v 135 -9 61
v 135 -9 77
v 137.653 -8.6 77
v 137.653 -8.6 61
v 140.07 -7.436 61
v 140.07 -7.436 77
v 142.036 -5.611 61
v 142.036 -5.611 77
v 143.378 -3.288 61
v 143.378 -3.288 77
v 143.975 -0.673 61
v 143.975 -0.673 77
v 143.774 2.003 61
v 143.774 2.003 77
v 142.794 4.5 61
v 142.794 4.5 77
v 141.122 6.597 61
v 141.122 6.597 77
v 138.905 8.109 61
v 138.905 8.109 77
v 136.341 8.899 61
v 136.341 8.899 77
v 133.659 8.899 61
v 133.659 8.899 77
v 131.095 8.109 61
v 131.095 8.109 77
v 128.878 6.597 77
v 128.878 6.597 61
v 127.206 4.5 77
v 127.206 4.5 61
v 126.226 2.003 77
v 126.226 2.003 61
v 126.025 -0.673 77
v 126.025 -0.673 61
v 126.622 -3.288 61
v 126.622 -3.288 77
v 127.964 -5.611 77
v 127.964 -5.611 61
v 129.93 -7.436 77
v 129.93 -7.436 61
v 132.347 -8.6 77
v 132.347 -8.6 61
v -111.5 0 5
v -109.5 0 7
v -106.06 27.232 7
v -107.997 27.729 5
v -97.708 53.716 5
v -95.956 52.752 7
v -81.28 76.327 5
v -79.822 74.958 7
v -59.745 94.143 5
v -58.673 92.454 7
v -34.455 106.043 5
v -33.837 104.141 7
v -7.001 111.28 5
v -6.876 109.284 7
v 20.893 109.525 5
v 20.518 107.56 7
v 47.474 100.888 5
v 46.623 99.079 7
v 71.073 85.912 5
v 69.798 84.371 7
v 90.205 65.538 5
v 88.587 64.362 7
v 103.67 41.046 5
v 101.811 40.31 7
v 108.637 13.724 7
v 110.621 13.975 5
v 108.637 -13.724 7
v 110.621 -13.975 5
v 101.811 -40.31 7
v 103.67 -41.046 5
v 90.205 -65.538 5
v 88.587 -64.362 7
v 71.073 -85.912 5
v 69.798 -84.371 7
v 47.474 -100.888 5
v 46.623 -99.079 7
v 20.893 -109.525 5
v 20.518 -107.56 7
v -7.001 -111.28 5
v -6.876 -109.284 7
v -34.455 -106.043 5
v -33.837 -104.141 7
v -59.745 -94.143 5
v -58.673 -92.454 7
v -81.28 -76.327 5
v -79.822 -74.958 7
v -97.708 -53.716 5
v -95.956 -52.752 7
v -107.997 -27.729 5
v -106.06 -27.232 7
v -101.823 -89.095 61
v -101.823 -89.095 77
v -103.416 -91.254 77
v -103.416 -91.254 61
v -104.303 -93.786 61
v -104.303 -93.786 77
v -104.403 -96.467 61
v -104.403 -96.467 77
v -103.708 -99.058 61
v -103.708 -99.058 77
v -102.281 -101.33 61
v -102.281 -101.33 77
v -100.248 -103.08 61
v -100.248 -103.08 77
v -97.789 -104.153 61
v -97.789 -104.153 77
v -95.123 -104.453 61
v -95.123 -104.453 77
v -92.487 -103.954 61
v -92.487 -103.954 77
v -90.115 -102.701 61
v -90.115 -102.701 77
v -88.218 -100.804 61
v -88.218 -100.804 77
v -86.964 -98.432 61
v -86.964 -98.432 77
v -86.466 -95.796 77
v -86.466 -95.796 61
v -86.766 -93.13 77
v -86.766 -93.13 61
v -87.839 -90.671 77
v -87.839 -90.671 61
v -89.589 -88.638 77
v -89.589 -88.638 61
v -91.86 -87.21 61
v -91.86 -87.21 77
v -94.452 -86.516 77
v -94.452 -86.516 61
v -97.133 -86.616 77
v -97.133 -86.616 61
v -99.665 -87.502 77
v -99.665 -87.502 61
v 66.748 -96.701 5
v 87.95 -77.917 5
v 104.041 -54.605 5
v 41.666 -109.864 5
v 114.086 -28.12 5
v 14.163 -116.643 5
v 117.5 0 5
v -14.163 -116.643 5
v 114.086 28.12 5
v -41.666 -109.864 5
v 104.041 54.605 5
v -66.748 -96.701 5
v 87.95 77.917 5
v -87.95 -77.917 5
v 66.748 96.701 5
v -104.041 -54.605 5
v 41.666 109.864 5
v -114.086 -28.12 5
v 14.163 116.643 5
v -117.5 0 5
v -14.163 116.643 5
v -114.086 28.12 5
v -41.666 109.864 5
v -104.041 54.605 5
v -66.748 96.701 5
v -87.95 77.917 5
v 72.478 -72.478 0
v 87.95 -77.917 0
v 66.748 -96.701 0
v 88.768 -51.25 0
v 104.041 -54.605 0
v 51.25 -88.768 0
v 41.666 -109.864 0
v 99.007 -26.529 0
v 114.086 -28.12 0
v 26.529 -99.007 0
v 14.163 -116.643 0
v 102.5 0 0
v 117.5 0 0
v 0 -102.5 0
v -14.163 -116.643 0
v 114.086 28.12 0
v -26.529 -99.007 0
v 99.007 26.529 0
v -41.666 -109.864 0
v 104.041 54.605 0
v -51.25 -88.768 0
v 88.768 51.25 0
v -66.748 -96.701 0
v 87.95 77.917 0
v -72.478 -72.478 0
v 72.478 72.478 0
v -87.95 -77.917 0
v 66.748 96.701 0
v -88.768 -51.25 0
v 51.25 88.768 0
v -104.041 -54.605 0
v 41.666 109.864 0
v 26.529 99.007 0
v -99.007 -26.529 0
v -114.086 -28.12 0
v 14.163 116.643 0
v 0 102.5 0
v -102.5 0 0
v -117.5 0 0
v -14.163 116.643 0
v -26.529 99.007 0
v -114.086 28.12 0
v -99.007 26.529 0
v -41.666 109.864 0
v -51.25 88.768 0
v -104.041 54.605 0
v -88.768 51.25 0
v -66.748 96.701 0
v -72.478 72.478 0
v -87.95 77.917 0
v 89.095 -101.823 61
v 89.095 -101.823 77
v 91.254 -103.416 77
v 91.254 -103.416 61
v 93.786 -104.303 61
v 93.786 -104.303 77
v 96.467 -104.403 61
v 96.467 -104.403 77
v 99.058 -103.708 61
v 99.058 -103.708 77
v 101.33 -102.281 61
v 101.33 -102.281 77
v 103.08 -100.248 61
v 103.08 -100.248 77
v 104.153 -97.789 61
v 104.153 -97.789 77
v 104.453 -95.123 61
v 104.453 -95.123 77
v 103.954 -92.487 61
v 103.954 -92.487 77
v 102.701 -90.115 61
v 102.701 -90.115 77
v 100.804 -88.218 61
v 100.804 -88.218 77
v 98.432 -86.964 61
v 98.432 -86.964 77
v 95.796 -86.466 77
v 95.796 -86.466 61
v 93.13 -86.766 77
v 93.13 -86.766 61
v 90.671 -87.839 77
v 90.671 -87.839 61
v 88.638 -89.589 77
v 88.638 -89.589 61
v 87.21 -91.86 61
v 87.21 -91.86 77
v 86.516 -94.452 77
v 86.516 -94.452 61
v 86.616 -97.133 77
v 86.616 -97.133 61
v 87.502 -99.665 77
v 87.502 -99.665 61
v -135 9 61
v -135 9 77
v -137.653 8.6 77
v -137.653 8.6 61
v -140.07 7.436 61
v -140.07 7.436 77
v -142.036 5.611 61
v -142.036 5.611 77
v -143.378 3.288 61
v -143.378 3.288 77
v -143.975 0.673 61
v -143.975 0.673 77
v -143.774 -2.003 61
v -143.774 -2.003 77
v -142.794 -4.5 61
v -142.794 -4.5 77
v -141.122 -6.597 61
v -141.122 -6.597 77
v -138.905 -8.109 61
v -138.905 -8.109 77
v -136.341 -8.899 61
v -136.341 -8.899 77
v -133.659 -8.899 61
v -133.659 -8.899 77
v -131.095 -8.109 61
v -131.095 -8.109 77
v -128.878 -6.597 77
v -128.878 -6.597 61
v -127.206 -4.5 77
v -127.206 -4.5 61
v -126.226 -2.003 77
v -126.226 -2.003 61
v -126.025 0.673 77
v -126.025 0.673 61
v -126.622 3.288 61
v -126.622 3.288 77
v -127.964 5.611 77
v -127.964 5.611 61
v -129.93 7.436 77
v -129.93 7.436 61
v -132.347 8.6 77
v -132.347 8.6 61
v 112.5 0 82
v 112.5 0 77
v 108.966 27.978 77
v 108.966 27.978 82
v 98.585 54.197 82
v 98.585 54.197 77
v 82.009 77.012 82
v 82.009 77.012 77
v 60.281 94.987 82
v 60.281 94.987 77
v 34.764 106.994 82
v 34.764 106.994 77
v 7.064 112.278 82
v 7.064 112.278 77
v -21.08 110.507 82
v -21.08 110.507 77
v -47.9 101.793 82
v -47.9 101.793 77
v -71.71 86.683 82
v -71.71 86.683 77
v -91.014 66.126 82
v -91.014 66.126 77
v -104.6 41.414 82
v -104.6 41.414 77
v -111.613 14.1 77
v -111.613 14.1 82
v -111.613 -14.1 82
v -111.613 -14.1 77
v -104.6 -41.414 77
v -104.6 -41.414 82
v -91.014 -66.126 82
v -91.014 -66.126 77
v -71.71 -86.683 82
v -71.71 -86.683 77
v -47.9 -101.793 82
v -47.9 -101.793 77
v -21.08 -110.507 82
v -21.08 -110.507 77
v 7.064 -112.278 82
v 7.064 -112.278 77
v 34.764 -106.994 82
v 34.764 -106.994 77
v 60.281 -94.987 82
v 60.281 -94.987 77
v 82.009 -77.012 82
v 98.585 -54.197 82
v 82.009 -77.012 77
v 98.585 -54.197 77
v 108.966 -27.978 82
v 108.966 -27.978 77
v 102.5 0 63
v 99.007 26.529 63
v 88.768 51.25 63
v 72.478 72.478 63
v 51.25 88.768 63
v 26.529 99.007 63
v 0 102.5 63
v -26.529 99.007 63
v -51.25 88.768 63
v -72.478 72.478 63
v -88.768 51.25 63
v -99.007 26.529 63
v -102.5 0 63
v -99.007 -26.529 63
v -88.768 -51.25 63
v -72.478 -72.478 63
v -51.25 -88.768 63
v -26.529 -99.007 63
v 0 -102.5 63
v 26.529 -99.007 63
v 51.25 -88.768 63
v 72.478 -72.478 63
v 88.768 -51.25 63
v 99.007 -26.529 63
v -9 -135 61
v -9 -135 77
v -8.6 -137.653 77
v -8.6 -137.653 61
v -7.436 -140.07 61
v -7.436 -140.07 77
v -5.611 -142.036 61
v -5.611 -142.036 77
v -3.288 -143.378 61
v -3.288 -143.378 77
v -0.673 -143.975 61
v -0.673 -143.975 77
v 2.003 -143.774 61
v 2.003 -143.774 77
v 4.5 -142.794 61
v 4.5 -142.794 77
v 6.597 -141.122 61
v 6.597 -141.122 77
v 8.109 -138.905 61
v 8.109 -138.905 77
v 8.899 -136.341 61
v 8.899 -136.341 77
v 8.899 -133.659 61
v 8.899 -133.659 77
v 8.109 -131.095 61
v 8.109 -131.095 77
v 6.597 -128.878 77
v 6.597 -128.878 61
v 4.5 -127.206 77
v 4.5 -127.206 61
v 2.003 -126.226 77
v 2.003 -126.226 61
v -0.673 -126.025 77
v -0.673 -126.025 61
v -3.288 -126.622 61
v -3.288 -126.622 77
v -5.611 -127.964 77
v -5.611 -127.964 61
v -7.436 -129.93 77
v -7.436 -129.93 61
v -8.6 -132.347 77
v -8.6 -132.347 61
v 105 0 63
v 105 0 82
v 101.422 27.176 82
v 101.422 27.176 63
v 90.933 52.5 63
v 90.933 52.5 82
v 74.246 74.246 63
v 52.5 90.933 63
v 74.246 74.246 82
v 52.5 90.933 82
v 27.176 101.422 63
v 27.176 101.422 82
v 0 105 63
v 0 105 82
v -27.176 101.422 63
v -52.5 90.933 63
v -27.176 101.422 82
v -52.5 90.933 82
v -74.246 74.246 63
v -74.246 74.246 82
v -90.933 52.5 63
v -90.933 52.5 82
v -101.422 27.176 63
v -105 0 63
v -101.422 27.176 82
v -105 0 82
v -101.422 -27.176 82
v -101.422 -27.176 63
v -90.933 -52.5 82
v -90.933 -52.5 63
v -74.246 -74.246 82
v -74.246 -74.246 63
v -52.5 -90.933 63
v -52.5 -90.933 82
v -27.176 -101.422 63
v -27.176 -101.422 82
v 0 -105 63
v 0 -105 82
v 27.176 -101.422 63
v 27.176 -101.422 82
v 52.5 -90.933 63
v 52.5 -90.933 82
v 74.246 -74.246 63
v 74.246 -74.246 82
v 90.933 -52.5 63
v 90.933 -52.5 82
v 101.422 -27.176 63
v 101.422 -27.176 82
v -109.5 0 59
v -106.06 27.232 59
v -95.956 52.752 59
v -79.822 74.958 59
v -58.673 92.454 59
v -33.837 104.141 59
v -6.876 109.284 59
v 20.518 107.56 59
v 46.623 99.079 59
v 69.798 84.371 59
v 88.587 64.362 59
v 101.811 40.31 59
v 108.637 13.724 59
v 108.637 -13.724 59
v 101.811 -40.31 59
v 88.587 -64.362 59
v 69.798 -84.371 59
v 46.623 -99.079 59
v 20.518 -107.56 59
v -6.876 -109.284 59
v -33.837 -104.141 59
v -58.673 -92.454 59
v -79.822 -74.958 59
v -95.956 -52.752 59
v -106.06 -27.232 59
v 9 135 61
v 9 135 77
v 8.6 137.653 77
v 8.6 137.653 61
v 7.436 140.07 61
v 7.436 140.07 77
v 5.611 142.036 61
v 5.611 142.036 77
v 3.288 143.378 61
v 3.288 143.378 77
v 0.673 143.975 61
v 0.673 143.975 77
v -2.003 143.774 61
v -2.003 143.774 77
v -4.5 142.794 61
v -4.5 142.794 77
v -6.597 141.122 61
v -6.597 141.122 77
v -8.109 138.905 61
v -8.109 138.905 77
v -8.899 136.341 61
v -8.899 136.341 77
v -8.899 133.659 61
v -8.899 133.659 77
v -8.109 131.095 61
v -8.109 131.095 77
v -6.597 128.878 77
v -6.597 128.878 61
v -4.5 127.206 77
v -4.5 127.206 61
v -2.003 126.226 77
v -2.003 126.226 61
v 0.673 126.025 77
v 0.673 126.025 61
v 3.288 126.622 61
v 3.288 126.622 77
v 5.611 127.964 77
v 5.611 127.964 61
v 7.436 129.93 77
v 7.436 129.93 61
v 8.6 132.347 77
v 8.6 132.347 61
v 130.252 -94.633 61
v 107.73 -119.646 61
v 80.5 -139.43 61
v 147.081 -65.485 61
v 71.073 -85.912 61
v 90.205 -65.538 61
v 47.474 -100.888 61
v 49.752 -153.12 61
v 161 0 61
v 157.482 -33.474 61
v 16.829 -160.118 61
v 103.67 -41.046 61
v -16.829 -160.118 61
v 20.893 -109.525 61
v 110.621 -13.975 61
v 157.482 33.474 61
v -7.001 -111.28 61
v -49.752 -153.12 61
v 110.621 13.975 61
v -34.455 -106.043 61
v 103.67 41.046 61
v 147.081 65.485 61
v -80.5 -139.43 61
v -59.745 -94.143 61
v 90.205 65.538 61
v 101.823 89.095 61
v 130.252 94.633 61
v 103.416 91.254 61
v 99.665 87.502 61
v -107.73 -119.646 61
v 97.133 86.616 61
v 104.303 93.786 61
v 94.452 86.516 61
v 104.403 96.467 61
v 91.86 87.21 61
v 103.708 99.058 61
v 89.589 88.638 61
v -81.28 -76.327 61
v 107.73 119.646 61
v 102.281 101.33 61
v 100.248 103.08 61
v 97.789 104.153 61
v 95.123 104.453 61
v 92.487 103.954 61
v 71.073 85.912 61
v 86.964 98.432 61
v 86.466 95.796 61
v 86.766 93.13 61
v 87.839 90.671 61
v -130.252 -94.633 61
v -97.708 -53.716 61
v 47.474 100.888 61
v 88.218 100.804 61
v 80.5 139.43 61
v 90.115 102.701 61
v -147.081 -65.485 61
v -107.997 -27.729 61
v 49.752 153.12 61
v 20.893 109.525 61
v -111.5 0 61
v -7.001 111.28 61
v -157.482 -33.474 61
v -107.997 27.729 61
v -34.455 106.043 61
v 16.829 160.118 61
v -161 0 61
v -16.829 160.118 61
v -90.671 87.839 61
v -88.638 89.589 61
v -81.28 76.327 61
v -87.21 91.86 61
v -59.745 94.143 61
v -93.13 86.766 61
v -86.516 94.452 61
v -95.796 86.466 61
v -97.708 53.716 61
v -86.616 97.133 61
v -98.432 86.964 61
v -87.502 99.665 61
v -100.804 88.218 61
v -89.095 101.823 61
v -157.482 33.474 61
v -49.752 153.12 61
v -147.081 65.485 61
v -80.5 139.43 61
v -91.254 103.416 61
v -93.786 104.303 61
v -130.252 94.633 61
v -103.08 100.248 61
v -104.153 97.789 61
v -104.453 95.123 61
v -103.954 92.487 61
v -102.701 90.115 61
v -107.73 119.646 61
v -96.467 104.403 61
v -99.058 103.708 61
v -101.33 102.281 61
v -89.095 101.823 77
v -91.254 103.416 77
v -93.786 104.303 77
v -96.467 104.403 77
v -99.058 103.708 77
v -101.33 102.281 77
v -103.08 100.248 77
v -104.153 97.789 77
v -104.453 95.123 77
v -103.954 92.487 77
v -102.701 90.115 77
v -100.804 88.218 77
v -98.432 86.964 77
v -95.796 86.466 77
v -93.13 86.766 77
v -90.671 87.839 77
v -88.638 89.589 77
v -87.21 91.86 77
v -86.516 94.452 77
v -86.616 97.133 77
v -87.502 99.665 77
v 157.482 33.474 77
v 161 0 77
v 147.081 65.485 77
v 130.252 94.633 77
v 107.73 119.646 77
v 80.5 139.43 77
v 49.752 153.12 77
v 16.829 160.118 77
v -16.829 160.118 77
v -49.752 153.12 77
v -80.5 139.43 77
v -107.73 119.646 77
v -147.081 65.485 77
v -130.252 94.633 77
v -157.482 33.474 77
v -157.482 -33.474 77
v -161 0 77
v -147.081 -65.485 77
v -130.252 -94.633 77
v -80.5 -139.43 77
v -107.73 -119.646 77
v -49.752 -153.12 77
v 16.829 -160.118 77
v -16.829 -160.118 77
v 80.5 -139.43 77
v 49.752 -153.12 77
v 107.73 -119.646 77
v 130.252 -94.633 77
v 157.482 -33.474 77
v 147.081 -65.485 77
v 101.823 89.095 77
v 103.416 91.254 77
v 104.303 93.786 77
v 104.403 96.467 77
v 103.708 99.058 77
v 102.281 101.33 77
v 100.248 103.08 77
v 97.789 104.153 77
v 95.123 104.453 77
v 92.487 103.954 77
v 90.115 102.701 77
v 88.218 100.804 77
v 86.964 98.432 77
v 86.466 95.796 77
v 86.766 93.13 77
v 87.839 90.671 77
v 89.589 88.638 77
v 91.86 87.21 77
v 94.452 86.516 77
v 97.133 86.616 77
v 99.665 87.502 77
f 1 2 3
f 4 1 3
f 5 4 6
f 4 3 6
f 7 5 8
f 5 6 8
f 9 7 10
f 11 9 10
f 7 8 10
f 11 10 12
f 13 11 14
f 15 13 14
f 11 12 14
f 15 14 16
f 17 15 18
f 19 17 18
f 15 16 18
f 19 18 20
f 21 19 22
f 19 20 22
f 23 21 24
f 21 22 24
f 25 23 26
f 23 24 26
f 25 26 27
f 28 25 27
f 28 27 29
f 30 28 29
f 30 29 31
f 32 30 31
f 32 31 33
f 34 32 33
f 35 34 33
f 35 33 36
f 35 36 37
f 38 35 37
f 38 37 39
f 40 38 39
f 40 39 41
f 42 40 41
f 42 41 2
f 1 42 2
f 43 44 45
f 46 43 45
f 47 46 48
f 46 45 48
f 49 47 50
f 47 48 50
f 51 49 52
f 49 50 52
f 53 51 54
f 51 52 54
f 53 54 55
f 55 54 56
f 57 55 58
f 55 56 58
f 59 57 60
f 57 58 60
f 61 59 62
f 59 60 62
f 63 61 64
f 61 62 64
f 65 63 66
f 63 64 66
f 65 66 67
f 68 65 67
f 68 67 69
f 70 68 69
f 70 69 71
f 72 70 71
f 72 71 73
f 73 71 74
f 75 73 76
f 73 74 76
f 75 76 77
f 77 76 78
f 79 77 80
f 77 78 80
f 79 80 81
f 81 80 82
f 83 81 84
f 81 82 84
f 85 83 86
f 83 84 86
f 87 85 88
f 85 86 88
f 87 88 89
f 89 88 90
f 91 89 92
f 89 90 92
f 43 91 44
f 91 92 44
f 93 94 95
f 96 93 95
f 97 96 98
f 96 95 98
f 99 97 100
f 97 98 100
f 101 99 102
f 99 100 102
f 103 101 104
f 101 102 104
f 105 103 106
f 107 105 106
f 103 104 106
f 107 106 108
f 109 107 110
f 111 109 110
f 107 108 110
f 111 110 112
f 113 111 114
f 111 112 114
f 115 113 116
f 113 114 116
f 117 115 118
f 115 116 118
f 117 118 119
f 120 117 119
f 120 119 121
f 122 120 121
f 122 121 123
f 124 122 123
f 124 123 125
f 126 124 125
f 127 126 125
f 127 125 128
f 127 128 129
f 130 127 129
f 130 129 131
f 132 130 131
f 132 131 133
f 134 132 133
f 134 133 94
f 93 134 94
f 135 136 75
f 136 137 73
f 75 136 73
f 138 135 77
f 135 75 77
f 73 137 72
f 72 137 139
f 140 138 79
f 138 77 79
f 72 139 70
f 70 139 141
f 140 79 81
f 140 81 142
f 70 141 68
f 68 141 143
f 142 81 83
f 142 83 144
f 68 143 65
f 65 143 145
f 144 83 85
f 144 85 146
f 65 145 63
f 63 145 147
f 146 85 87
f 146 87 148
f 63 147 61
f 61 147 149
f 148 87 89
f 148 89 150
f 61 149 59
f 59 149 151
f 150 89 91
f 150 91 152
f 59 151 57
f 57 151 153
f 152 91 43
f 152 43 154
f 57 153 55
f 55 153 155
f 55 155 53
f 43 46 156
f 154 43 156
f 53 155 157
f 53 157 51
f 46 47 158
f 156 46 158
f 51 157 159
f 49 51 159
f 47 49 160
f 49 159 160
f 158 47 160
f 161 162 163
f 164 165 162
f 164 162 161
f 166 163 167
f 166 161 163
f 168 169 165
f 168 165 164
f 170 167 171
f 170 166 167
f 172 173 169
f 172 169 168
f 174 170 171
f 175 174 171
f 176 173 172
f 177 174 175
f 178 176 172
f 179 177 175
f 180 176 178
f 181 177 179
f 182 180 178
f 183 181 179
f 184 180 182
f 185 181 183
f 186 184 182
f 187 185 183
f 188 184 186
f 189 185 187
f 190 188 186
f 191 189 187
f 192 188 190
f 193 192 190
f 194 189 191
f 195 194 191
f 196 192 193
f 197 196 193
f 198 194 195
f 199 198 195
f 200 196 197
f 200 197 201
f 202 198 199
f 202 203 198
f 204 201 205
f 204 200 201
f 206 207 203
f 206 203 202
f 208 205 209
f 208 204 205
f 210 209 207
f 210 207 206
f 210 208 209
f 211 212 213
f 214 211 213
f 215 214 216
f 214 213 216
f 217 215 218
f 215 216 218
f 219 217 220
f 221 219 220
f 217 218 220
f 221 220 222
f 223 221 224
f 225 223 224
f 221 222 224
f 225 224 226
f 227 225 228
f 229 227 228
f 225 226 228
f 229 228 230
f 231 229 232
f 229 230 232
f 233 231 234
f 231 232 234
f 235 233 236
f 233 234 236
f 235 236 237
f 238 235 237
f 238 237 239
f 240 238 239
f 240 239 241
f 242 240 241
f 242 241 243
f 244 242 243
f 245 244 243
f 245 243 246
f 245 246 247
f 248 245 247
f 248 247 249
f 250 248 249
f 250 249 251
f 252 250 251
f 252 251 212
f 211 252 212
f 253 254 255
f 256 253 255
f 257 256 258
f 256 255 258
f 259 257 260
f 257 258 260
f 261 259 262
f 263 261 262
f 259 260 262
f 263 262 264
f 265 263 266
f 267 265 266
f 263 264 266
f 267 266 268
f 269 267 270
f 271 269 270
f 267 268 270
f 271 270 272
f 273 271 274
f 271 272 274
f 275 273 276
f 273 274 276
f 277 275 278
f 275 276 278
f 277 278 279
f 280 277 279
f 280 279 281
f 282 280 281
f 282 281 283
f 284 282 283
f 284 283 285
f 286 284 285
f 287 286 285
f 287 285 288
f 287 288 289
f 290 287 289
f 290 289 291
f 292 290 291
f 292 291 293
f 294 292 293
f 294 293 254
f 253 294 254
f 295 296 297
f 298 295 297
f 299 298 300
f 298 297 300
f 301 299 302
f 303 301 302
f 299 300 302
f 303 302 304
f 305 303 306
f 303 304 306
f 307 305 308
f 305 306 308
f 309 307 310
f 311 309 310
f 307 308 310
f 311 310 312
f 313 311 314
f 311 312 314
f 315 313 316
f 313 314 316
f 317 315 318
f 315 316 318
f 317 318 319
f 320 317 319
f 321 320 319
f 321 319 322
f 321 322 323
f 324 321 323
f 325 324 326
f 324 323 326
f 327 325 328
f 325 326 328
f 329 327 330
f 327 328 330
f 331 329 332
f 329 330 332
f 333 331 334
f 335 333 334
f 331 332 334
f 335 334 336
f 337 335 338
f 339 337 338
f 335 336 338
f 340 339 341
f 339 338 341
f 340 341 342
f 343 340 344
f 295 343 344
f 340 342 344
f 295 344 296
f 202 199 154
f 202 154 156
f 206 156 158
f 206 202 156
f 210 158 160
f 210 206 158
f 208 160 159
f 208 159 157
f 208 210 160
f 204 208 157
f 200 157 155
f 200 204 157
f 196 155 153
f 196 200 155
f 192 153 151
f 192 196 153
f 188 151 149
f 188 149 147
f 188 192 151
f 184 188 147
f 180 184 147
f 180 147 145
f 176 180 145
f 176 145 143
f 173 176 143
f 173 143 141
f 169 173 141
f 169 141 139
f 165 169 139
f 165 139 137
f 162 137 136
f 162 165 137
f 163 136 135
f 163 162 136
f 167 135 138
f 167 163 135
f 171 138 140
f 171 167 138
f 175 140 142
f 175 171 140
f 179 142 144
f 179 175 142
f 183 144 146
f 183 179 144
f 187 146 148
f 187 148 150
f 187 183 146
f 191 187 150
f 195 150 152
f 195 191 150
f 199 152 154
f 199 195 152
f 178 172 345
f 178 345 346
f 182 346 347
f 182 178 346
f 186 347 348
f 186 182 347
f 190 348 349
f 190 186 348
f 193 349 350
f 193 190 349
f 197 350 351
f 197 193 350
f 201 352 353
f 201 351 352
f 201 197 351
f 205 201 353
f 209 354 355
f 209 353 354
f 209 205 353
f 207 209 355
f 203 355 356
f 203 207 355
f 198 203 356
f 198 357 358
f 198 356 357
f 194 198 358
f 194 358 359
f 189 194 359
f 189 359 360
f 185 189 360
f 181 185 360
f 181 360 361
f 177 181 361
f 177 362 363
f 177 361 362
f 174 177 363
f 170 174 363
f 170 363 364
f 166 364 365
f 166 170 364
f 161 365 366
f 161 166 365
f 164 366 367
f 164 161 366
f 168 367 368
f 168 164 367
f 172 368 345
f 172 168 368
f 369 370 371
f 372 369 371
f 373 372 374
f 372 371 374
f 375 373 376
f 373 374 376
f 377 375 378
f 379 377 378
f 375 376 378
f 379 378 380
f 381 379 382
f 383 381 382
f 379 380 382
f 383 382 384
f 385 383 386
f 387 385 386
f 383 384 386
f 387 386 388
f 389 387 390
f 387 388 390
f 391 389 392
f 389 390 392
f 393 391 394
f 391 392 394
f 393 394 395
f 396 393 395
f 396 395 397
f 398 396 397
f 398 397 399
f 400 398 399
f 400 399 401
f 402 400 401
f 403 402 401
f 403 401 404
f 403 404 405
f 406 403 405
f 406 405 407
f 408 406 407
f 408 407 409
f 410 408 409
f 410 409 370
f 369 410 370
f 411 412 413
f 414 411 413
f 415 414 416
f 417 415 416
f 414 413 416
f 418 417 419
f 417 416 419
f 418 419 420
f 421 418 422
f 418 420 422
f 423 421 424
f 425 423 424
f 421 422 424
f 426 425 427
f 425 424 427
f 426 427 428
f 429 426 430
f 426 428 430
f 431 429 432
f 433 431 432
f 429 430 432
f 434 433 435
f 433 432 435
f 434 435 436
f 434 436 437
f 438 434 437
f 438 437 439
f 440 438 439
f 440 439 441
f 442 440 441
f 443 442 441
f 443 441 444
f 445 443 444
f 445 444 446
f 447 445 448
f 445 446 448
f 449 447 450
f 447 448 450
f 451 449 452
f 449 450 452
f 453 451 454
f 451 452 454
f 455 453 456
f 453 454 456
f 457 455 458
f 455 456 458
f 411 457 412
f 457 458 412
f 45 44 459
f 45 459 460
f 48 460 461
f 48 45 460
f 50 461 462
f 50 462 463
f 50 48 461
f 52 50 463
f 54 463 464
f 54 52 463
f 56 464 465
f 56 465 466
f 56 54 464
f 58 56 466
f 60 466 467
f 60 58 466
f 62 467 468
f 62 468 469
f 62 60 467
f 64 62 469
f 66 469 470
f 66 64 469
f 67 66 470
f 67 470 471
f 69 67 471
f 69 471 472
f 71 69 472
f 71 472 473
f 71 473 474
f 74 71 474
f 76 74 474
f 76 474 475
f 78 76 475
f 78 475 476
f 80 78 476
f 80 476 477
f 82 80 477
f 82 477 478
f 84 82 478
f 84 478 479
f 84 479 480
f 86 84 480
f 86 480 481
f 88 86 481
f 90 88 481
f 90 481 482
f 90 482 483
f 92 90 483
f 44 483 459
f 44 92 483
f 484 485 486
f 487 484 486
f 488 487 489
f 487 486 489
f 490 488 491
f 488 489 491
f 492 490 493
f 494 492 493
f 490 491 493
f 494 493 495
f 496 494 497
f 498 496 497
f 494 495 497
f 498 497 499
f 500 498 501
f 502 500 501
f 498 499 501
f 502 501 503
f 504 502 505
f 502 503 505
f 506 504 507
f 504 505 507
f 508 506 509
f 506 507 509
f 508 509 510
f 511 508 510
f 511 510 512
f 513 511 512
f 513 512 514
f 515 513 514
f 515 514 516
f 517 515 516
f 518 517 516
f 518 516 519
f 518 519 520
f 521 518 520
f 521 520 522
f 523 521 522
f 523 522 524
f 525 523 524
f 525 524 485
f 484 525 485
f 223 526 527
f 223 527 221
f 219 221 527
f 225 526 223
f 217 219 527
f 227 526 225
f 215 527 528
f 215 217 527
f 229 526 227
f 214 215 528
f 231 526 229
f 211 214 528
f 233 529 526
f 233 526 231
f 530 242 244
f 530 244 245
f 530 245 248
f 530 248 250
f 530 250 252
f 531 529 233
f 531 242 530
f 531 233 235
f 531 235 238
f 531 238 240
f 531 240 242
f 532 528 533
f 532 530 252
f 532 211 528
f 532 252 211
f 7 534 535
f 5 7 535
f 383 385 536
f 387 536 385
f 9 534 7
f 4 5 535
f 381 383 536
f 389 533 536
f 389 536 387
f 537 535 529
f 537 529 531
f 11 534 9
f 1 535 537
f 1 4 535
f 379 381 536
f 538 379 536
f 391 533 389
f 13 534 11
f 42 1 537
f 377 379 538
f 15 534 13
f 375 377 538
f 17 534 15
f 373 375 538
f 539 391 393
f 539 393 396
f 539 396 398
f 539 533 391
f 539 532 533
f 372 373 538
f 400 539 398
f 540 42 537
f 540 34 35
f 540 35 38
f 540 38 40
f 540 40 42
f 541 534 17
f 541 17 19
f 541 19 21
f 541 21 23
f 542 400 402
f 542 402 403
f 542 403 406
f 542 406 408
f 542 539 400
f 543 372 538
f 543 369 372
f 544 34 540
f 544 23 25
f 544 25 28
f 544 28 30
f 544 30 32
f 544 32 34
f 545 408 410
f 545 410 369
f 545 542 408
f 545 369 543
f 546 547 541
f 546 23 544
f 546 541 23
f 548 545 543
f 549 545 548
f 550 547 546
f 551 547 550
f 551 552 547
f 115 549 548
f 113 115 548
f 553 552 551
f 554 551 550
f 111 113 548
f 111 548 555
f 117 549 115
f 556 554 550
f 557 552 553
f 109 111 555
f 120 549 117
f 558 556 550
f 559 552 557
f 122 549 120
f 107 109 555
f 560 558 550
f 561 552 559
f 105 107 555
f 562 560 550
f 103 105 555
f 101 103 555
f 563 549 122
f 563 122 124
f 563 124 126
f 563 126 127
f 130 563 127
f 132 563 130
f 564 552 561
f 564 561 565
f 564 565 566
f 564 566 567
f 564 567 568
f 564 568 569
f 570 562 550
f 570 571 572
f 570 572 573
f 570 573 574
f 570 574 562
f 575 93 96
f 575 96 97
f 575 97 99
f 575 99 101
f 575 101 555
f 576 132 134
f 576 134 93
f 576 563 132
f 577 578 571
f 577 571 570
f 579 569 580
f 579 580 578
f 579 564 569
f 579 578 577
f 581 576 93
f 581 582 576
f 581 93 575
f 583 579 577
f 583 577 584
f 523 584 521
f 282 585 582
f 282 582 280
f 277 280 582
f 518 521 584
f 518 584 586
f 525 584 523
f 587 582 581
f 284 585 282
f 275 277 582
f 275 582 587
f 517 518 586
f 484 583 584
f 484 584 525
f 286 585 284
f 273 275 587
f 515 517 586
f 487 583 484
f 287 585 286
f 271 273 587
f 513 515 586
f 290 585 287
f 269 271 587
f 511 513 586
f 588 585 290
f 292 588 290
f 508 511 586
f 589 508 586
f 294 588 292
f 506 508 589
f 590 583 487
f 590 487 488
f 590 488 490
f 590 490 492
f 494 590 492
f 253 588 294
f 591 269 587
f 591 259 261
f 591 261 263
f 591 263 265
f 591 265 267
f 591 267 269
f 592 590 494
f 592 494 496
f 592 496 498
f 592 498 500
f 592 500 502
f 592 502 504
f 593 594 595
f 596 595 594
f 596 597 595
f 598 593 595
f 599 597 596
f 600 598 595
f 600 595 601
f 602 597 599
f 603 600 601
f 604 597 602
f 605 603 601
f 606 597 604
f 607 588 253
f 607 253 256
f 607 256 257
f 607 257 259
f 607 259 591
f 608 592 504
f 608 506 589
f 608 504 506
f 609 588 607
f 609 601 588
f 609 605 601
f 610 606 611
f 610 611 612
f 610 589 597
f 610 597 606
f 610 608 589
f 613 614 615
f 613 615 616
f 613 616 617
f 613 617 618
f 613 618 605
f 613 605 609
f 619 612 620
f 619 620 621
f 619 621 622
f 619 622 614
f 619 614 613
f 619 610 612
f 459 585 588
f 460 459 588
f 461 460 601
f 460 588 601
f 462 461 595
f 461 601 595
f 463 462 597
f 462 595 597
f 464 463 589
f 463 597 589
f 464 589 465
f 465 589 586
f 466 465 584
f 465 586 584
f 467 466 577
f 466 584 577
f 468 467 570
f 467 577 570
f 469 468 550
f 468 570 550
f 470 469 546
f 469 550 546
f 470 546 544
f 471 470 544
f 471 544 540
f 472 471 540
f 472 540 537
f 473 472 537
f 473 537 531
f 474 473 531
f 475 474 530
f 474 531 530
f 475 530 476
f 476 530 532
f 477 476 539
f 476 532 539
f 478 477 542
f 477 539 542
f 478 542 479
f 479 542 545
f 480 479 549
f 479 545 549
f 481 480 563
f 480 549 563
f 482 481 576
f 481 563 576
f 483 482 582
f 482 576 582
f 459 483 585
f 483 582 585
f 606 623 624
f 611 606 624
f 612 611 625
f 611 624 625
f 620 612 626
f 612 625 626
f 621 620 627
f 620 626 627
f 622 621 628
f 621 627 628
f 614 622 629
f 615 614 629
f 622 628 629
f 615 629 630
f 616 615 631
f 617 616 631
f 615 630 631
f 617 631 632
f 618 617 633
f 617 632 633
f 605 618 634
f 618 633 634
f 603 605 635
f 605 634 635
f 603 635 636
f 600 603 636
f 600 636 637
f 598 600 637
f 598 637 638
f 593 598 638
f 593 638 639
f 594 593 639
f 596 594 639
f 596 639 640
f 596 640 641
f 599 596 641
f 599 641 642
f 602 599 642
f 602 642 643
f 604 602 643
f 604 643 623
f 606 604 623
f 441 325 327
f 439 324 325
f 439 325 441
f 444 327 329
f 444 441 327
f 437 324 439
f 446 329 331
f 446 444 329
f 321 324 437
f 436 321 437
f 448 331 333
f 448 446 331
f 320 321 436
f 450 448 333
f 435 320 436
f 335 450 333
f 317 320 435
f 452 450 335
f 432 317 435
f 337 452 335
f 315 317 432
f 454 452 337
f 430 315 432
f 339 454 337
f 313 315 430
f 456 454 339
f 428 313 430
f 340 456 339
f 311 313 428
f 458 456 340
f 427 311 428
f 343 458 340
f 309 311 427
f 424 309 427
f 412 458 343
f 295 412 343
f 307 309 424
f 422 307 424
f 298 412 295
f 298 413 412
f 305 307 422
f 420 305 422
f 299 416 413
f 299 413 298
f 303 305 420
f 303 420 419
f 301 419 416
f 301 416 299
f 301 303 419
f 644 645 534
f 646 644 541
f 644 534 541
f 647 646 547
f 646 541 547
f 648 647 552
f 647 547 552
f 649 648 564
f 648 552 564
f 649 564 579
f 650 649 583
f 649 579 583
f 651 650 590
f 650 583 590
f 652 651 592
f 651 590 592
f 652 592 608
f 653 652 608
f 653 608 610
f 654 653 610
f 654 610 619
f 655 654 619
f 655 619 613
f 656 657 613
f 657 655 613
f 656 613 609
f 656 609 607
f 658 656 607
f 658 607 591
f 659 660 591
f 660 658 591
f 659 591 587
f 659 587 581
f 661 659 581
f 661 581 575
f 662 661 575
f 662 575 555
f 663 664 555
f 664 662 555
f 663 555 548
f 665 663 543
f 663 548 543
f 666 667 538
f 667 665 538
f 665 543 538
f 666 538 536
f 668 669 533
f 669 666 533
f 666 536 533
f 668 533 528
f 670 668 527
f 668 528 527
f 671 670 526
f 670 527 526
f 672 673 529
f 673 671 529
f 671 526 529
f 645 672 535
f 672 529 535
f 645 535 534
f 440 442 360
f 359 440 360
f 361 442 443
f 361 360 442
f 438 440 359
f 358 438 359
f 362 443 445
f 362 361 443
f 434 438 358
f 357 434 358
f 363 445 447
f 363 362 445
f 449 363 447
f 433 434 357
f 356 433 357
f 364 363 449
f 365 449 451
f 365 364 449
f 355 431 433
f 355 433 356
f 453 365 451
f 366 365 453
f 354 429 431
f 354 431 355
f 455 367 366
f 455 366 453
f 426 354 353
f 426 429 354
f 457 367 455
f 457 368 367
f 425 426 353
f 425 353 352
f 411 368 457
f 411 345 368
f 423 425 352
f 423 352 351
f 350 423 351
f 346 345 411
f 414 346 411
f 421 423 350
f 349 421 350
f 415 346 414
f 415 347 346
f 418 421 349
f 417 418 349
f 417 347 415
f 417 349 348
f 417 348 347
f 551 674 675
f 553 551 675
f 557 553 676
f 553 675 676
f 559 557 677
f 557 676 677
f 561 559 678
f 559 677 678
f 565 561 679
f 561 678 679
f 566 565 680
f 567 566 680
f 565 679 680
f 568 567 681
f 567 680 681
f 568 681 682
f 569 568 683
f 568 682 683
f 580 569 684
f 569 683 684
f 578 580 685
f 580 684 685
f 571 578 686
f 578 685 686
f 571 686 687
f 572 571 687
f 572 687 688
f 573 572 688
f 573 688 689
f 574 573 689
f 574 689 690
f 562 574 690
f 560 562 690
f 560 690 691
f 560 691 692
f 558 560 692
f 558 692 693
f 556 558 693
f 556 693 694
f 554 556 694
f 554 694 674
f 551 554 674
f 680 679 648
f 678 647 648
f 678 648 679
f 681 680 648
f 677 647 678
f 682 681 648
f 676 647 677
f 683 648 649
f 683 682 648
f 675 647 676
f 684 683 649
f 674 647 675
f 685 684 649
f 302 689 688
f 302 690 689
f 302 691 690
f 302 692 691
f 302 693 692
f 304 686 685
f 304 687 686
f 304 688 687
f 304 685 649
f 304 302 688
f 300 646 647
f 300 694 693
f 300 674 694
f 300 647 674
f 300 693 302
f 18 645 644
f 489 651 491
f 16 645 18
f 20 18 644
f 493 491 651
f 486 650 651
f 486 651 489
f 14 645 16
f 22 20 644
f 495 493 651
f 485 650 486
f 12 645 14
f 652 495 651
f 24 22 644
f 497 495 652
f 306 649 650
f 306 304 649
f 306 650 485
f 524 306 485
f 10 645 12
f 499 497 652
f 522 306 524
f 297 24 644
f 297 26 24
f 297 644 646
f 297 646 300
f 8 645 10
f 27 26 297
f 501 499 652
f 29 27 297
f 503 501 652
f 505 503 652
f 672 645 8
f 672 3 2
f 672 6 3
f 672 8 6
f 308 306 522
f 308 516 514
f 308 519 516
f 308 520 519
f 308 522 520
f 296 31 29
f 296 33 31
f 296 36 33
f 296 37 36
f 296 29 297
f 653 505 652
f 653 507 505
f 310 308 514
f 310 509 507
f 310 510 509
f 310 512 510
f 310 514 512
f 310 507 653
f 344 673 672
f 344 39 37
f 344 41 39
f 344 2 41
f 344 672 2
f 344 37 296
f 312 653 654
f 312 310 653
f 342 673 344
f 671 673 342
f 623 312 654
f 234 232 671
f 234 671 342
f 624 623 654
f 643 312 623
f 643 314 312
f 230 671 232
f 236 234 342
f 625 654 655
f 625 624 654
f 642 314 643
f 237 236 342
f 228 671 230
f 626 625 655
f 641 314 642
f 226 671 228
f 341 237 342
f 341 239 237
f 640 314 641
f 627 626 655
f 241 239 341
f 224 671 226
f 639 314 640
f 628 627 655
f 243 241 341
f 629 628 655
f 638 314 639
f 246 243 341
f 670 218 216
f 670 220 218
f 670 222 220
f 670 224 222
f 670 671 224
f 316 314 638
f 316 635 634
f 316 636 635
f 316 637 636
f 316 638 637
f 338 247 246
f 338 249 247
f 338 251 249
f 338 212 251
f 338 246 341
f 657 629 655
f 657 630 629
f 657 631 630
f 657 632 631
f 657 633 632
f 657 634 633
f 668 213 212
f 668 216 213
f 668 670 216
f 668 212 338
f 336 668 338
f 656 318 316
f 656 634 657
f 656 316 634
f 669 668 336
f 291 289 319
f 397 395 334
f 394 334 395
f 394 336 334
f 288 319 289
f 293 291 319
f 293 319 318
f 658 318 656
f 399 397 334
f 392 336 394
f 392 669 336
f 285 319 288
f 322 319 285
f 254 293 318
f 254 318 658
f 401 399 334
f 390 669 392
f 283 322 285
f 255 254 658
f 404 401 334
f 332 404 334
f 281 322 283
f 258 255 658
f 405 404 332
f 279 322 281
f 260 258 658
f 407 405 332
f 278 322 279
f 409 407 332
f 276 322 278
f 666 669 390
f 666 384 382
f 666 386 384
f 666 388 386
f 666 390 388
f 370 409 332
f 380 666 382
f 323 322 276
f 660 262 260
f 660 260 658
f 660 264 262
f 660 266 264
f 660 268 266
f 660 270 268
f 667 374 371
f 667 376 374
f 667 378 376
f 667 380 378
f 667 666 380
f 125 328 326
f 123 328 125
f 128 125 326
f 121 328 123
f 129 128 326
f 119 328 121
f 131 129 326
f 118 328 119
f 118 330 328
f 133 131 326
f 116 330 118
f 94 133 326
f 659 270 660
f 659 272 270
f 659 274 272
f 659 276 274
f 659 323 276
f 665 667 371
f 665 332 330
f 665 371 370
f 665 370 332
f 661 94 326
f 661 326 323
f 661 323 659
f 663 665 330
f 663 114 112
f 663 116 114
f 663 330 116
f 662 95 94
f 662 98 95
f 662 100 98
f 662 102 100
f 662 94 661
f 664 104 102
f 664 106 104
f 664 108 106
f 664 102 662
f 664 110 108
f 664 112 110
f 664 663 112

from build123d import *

# Parameters (mm, degrees)
SKETCH1_R           = 161
SKETCH1_R_2         = 102.5
BOSS_EXTRUDE1_DEPTH = 82
SKETCH2_R           = 9
CUT_EXTRUDE1_DEPTH  = 243.004132196
CIRPATTERN1_COUNT   = 8
SKETCH3_R           = 161
SKETCH3_R_2         = 109.5
CUT_EXTRUDE2_DEPTH  = 61
SKETCH4_R           = 117.5
SKETCH4_R_2         = 109.5
BOSS_EXTRUDE3_DEPTH = 5
CUT_EXTRUDE3_START  = -5
SKETCH6_R           = 161
SKETCH6_R_2         = 112.5
CUT_EXTRUDE3_DEPTH  = 5
CHAMFER1_SIZE       = 2
CHAMFER2_SIZE       = 2
SKETCH8_R           = 105
CUT_EXTRUDE5_DEPTH  = 19


with BuildPart() as part:
    # Sketch1 → Boss-Extrude1 (new body)
    with BuildSketch(Plane.XY):
        Circle(SKETCH1_R)
        Circle(SKETCH1_R_2, mode=Mode.SUBTRACT)
    extrude(amount=BOSS_EXTRUDE1_DEPTH)

    # Sketch2 → Cut-Extrude1 (cut, through all)
    with BuildSketch(Plane.XY.offset(82)):
        with Locations((0, 135)):
            Circle(SKETCH2_R)
    cut_extrude1 = extrude(amount=-CUT_EXTRUDE1_DEPTH, mode=Mode.SUBTRACT)

    # CirPattern1: Cut-Extrude1 ×8 about axis
    cirpattern1_axis = Axis((0, 0, 0), (0, 0, 1))
    for i in range(1, CIRPATTERN1_COUNT):
        add(cut_extrude1.rotate(cirpattern1_axis, i * 360 / CIRPATTERN1_COUNT), mode=Mode.SUBTRACT)

    # Sketch3 → Cut-Extrude2 (cut)
    with BuildSketch(Plane(origin=(0, 0, 0), x_dir=(-1, 0, 0), z_dir=(0, 0, -1))):
        Circle(SKETCH3_R)
        Circle(SKETCH3_R_2, mode=Mode.SUBTRACT)
    extrude(amount=-CUT_EXTRUDE2_DEPTH, mode=Mode.SUBTRACT)

    # Sketch4 → Boss-Extrude3 (add)
    with BuildSketch(Plane(origin=(0, 0, 0), x_dir=(-1, 0, 0), z_dir=(0, 0, -1))):
        Circle(SKETCH4_R)
        Circle(SKETCH4_R_2, mode=Mode.SUBTRACT)
    extrude(amount=-BOSS_EXTRUDE3_DEPTH)

    # Sketch6 → Cut-Extrude3 (cut)
    with BuildSketch(Plane.XY.offset(82).offset(CUT_EXTRUDE3_START)):
        with Locations(Location((0, 0, 0), (0, 0, 180))):
            Circle(SKETCH6_R)
        Circle(SKETCH6_R_2, mode=Mode.SUBTRACT)
    extrude(amount=CUT_EXTRUDE3_DEPTH, mode=Mode.SUBTRACT)

    # Chamfer1
    chamfer1_edges = [part.edges().sort_by_distance(p)[0] for p in [
        (109.5, 0, 5),
    ]]
    chamfer(chamfer1_edges, length=CHAMFER1_SIZE)

    # Chamfer2
    chamfer2_edges = [part.edges().sort_by_distance(p)[0] for p in [
        (109.5, 0, 61),
    ]]
    chamfer(chamfer2_edges, length=CHAMFER2_SIZE)

    # Sketch8 → Cut-Extrude5 (cut)
    with BuildSketch(Plane.XY.offset(82)):
        Circle(SKETCH8_R)
    extrude(amount=-CUT_EXTRUDE5_DEPTH, mode=Mode.SUBTRACT)


solid = part.part
